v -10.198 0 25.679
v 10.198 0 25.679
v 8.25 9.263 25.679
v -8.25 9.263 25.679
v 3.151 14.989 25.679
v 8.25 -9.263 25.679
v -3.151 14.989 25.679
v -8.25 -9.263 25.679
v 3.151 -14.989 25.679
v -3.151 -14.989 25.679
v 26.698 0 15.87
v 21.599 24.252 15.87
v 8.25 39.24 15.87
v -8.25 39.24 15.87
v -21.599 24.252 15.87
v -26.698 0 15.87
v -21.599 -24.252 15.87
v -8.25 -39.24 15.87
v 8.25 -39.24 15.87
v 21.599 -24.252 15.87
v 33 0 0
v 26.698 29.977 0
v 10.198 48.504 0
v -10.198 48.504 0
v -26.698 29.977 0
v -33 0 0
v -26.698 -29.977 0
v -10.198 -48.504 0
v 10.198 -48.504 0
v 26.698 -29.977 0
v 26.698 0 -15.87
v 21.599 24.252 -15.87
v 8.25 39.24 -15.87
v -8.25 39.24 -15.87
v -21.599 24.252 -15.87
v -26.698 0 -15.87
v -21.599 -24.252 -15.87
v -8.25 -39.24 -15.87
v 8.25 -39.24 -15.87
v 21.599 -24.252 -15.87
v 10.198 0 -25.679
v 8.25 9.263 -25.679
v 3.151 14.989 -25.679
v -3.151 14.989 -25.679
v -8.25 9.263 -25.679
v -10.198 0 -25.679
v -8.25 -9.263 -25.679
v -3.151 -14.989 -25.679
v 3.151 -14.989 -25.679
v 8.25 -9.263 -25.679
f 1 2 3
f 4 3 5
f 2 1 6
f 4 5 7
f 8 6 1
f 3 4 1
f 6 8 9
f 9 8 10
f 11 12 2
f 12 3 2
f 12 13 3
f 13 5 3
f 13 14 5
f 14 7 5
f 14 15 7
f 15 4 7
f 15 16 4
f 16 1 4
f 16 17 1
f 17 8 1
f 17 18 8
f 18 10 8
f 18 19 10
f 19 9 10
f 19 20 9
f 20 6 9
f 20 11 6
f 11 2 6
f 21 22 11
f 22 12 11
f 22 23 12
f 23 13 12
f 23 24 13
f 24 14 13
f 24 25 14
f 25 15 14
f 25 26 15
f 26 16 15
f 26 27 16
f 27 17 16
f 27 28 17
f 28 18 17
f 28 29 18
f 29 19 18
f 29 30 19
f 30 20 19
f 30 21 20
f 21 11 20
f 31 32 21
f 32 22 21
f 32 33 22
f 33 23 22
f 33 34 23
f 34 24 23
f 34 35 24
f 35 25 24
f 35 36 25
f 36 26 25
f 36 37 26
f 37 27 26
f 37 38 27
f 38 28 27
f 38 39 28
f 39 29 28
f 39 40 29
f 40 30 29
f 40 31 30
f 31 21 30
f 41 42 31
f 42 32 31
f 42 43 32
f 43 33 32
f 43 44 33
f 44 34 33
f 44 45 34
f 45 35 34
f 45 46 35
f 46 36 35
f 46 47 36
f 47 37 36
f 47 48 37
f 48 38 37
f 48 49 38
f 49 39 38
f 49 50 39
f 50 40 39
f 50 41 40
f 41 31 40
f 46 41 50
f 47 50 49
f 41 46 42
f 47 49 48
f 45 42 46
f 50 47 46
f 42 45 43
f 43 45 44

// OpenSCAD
// Generated by SolidPython 1.0.1 on 2020-07-29 00:46:50


scale(v = [11, 17, 9]) {
	sphere(r = 3);
}
/***********************************************
*********      SolidPython code:      **********
************************************************
 
# import packages: SolidPython
from solid import *
from solid.utils import *
from itertools import chain, combinations, permutations


class Resize:

    def __init__(self, scad_file):
        self.scad_file = scad_file
        #self.scad_file = import_scad(scad_file)
        # cone/cylinder param:
        self.r1 = 0
        self.r2 = 0
        self.h = 0
        # rectangular prism param:
        self.w = 0
        self.l = 0
        # ellipse param:
        self.r = 0

    # import OpenScad code (file name corresponds to shape)


    # classify shape + parameters
    def assign(self, param1, param2, param3):
        if self.scad_file == 'cone.scad':
            self.r1 = param1
            self.r2 = param2
            self.h = param3
        elif self.scad_file == 'cylinder.scad':
            self.r1 = param1
            self.r2 = param2
            self.h = param3
        elif self.scad_file == 'rectangularPrism.scad':
            self.h = param1
            self.l = param2
            self.w = param3
        else:
            self.r = param1
            self.h = param2

    # resize parameters
    def iterate(self):
        x = range(3, 20, 2)
        i = 1
        if self.scad_file == 'cone.scad':
            tempList = list(permutations(x, 2))
            for temp in tempList:
                param1 = temp[0]
                param2 = temp[1]
                filepath = 'produced_scad_files/' + 'cone' + str(param1) + '_' + str(param2) + '_' + '.scad'
                scad_render_to_file(cylinder(h=param1, r1=param2, r2=0), filepath)

        elif self.scad_file == 'cylinder.scad':
            tempList = list(permutations(x, 3))
            for temp in tempList:
                param1 = temp[0]
                param2 = temp[1]
                filepath = 'produced_scad_files/' + 'cylinder' + str(param1) + '_' + str(param2) + '_' + '.scad'
                scad_render_to_file(cylinder(h=param1, r1=param2, r2=param2), filepath)

        elif self.scad_file == 'rectangularPrism.scad':
            tempList = list(permutations(x, 3))
            for temp in tempList:
                param1 = temp[0]
                param2 = temp[1]
                param3 = temp[2]
                filepath = 'produced_scad_files/' + 'rectangularPrism' + str(param1) + '_' + str(param2) + '_' + str(
                    param3) + '.scad'
                scad_render_to_file(cube(size=(param1, param2, param3)), filepath)

        elif self.scad_file == 'ellipse.scad':
            tempList = list(permutations(x, 4))
            for temp in tempList:
                param1 = temp[0]
                param2 = temp[1]
                param3 = temp[2]
                param4 = temp[3]
                filepath = 'produced_scad_files/' + 'ellipse' + str(param1) + '_' + str(param2) + '_' + str(param3) + '_' + str(param4) + '.scad'
                scad_render_to_file(scale([param1, param2, param3])(sphere(r=param4)), filepath)

    def render_to_scadfile(self):
        scad_render_to_file(scad, 'example.scad') 
 
************************************************/
